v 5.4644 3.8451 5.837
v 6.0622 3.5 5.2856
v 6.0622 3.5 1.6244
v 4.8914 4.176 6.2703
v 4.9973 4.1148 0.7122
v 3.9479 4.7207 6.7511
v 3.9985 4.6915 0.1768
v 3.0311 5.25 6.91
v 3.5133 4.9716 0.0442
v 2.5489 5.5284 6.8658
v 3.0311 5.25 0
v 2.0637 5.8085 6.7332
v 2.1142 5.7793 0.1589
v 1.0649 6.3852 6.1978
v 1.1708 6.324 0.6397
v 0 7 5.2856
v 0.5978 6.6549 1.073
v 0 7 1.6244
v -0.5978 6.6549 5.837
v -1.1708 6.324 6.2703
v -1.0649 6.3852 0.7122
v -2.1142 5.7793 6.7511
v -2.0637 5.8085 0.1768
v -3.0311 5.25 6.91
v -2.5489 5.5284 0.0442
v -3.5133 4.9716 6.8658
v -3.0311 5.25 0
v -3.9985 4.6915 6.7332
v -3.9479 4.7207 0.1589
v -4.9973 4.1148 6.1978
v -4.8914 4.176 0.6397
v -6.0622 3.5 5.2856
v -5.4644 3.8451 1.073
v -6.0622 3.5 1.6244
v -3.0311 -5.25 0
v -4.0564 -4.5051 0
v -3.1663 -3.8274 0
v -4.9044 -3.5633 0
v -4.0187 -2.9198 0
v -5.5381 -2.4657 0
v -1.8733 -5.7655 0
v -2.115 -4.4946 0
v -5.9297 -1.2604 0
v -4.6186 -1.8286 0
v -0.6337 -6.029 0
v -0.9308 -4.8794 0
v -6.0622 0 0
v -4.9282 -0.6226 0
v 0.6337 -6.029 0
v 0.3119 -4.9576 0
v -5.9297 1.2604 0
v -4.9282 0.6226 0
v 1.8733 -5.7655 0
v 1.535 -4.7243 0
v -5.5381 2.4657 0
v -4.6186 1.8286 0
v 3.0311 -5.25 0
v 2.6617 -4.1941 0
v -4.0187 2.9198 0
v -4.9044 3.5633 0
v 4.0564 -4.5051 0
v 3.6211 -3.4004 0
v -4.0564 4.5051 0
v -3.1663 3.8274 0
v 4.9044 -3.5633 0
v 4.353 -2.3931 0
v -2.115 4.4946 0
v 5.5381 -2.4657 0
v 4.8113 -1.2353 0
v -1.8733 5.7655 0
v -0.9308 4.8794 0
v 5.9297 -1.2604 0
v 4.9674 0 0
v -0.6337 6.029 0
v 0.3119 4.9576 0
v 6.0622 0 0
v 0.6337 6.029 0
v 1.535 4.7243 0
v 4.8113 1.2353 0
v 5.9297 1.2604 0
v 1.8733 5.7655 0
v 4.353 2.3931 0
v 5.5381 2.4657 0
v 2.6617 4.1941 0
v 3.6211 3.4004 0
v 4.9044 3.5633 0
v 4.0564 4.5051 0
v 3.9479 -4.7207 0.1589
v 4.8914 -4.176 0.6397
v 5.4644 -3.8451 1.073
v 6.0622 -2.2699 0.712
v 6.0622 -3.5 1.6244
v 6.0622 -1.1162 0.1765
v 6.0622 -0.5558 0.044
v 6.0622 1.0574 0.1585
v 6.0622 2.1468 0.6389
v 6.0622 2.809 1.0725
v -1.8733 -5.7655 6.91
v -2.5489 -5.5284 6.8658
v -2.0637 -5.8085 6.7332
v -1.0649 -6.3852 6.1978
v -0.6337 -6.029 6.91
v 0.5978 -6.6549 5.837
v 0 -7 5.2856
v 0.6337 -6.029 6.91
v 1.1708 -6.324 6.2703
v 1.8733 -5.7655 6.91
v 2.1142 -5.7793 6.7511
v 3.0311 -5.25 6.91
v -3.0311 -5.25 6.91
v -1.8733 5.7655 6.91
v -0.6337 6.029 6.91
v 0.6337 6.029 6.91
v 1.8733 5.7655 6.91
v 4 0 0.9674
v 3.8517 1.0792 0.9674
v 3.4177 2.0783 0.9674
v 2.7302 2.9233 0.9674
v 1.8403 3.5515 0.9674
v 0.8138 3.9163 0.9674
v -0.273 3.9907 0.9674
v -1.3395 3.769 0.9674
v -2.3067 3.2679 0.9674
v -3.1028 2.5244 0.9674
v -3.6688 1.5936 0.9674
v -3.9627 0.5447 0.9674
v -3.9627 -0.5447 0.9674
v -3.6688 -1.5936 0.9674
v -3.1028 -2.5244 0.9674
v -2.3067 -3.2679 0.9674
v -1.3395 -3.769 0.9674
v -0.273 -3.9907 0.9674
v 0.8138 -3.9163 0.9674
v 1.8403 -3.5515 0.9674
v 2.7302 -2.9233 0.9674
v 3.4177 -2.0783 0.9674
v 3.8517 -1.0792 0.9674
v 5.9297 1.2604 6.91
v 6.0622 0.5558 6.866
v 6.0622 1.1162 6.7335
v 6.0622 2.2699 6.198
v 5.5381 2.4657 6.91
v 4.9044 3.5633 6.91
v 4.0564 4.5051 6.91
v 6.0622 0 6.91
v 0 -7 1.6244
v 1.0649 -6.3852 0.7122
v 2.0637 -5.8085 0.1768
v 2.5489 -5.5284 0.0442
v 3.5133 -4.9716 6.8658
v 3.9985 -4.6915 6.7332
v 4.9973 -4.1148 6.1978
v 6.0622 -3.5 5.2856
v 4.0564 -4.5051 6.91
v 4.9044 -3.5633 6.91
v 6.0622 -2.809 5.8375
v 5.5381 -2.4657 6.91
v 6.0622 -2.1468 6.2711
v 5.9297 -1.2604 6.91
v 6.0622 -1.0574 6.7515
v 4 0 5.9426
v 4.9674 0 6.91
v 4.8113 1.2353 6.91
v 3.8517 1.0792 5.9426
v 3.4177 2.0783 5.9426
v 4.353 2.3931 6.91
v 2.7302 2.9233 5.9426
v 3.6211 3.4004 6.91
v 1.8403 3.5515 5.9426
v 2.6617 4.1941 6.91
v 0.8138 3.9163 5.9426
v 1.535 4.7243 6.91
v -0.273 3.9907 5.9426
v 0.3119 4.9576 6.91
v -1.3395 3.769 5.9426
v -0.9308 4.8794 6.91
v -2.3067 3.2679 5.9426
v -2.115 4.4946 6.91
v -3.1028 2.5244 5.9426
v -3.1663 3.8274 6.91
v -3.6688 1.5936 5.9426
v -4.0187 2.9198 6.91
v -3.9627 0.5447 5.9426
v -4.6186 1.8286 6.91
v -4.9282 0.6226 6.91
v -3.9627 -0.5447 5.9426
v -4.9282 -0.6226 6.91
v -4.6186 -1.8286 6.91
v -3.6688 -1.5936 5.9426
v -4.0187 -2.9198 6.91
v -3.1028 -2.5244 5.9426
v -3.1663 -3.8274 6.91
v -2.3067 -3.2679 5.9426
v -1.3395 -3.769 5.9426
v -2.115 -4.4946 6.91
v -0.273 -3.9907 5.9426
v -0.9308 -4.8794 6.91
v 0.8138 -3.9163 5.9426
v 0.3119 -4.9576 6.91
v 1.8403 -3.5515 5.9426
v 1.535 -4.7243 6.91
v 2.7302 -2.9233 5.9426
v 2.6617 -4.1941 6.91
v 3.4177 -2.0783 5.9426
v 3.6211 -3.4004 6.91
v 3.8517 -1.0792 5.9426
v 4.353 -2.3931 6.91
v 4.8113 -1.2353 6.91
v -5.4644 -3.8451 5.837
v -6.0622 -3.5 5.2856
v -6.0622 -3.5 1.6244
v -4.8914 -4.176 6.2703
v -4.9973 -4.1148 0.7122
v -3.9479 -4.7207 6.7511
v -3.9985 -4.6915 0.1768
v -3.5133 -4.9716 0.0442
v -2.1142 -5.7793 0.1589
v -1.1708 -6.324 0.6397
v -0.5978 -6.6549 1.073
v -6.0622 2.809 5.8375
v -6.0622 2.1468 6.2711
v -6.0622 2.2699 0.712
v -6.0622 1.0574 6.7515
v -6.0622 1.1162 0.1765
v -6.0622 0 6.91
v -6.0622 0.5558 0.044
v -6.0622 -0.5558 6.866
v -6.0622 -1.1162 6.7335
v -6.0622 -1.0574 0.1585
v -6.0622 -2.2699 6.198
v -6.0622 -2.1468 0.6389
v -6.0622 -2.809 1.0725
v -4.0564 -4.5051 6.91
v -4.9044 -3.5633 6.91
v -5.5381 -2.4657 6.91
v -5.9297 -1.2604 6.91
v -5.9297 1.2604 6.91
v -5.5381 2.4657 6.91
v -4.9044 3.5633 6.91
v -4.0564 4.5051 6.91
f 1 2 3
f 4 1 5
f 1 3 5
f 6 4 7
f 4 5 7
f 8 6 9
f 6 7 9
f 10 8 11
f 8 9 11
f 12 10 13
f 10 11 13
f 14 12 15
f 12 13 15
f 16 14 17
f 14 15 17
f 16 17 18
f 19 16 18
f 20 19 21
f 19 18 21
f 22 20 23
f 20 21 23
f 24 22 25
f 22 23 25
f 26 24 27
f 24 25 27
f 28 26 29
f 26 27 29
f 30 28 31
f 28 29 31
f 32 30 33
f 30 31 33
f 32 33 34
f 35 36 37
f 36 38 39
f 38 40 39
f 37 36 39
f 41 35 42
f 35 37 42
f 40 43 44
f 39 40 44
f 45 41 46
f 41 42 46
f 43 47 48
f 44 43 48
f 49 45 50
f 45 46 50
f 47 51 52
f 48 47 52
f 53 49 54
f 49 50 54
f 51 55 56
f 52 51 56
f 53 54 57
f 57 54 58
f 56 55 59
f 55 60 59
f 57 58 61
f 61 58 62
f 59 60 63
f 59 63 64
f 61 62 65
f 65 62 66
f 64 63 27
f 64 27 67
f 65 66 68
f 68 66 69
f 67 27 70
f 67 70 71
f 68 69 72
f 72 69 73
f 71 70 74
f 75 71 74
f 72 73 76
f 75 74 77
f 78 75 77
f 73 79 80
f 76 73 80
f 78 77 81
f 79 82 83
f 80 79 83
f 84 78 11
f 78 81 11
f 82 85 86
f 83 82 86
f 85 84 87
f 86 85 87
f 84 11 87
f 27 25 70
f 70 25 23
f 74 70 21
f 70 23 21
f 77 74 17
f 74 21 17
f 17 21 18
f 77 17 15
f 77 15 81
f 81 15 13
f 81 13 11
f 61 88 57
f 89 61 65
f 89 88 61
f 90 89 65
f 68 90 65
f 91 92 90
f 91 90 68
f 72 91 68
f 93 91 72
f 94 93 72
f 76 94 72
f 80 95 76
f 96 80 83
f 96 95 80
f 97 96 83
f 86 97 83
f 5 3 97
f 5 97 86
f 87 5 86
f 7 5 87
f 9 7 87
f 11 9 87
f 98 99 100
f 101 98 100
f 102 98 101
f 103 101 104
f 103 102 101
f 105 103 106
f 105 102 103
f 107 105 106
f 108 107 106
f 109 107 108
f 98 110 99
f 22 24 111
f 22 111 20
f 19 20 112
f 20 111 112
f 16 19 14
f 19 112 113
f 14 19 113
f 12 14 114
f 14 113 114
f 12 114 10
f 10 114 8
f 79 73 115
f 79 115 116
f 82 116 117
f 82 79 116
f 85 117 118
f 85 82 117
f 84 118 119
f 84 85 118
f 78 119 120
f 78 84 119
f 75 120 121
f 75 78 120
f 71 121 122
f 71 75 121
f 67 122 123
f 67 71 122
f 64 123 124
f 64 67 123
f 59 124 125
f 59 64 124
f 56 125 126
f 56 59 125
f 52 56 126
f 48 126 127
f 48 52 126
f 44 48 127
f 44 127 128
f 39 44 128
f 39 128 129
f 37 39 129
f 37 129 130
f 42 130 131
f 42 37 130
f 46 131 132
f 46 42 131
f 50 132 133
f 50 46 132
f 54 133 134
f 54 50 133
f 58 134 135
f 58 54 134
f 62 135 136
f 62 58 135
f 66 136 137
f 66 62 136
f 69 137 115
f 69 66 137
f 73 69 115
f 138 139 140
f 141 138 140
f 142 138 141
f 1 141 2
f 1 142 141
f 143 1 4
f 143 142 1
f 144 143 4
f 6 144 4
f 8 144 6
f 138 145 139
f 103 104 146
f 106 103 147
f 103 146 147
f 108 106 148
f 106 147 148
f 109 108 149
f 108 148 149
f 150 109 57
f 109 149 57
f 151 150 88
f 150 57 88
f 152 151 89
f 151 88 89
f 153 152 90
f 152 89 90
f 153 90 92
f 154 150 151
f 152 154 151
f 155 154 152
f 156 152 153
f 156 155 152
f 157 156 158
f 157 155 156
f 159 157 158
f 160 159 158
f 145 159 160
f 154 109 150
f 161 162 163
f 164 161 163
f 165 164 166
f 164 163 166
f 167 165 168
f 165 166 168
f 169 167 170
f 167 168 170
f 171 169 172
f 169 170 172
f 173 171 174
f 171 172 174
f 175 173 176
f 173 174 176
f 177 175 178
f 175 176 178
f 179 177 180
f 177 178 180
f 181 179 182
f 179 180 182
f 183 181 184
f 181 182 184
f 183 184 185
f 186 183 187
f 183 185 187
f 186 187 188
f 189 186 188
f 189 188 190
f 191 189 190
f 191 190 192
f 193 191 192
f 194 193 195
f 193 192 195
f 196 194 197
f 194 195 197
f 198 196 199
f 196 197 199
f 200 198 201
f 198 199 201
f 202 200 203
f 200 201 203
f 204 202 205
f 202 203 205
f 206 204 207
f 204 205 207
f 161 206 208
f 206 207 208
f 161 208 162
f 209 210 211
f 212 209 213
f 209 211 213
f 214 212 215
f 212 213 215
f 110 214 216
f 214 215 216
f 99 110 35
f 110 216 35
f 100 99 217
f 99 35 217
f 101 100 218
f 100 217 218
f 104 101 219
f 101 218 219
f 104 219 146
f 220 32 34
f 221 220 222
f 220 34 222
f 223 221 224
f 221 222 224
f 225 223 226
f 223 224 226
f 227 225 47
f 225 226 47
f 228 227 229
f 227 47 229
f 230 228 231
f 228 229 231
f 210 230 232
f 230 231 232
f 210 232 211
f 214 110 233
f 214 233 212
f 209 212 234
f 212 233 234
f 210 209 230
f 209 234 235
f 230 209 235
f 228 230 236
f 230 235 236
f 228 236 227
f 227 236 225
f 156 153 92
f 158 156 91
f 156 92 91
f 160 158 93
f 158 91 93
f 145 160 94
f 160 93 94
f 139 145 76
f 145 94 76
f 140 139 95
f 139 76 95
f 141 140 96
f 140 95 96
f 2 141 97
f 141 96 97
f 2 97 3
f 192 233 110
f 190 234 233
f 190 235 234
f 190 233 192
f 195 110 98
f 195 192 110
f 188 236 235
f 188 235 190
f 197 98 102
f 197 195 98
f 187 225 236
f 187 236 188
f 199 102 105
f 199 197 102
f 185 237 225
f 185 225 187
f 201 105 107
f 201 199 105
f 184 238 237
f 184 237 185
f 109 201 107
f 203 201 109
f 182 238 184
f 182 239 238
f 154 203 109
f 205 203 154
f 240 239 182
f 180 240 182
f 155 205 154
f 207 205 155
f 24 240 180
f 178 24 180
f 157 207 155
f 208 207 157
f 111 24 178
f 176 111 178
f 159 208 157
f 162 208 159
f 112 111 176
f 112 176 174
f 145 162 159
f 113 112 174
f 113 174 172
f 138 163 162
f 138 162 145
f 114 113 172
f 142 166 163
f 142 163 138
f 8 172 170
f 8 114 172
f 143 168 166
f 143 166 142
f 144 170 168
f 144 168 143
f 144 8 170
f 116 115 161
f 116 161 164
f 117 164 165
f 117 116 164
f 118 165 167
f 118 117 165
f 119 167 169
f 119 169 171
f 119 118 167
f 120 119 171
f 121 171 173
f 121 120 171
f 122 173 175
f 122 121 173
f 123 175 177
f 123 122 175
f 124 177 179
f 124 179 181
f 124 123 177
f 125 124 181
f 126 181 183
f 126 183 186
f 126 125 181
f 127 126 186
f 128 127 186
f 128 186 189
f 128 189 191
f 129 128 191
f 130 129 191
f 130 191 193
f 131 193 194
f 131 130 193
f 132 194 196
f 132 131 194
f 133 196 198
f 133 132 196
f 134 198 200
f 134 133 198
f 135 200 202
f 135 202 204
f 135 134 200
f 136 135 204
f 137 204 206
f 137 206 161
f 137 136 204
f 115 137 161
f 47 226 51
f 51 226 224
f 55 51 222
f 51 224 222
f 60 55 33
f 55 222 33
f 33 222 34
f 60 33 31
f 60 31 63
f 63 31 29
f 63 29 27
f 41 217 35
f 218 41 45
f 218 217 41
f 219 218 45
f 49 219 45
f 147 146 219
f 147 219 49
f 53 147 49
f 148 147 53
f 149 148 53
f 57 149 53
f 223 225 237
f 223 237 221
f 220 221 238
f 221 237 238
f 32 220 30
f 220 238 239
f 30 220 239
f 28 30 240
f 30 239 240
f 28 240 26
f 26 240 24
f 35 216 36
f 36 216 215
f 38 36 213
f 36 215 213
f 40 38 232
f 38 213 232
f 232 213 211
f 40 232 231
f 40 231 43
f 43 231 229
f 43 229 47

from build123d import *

# Parameters (mm, degrees)
SKETCH_R        = 4
PAD_DEPTH       = 6.91
CHAMFER_SIZE    = 0.9674
CHAMFER001_SIZE = 0.9674
GROOVE_ANGLE    = -360


with BuildPart() as part:
    # Sketch → Pad (new body)
    with BuildSketch(Plane.XY):
        Polygon((0, 7), (-6.062178, 3.5), (-6.062178, -3.5), (0, -7), (6.062178, -3.5), (6.062178, 3.5), align=None)
        Circle(SKETCH_R, mode=Mode.SUBTRACT)
    extrude(amount=PAD_DEPTH)

    # Chamfer
    chamfer_edges = [part.edges().sort_by_distance(p)[0] for p in [
        (-4, 0, 6.91),
    ]]
    chamfer(chamfer_edges, length=CHAMFER_SIZE)

    # Chamfer001
    chamfer001_edges = [part.edges().sort_by_distance(p)[0] for p in [
        (-4, 0, 0),
    ]]
    chamfer(chamfer001_edges, length=CHAMFER001_SIZE)

    # Sketch001 → Groove (revolve, symmetric, cut)
    with BuildSketch(Plane.YZ) as groove_sk:
        Polygon((-6.062178, 6.91), (-7, 6.91), (-7, 5.285644), align=None)
        Polygon((-7, 1.624356), (-7, 0), (-6.062178, 0), align=None)
    revolve(axis=Axis((0, 0, 0), (0, 0, 1)), revolution_arc=GROOVE_ANGLE / 2, mode=Mode.SUBTRACT)
    revolve(groove_sk.sketch, axis=Axis((0, 0, 0), (0, 0, -1)), revolution_arc=GROOVE_ANGLE / 2, mode=Mode.SUBTRACT)


solid = part.part
